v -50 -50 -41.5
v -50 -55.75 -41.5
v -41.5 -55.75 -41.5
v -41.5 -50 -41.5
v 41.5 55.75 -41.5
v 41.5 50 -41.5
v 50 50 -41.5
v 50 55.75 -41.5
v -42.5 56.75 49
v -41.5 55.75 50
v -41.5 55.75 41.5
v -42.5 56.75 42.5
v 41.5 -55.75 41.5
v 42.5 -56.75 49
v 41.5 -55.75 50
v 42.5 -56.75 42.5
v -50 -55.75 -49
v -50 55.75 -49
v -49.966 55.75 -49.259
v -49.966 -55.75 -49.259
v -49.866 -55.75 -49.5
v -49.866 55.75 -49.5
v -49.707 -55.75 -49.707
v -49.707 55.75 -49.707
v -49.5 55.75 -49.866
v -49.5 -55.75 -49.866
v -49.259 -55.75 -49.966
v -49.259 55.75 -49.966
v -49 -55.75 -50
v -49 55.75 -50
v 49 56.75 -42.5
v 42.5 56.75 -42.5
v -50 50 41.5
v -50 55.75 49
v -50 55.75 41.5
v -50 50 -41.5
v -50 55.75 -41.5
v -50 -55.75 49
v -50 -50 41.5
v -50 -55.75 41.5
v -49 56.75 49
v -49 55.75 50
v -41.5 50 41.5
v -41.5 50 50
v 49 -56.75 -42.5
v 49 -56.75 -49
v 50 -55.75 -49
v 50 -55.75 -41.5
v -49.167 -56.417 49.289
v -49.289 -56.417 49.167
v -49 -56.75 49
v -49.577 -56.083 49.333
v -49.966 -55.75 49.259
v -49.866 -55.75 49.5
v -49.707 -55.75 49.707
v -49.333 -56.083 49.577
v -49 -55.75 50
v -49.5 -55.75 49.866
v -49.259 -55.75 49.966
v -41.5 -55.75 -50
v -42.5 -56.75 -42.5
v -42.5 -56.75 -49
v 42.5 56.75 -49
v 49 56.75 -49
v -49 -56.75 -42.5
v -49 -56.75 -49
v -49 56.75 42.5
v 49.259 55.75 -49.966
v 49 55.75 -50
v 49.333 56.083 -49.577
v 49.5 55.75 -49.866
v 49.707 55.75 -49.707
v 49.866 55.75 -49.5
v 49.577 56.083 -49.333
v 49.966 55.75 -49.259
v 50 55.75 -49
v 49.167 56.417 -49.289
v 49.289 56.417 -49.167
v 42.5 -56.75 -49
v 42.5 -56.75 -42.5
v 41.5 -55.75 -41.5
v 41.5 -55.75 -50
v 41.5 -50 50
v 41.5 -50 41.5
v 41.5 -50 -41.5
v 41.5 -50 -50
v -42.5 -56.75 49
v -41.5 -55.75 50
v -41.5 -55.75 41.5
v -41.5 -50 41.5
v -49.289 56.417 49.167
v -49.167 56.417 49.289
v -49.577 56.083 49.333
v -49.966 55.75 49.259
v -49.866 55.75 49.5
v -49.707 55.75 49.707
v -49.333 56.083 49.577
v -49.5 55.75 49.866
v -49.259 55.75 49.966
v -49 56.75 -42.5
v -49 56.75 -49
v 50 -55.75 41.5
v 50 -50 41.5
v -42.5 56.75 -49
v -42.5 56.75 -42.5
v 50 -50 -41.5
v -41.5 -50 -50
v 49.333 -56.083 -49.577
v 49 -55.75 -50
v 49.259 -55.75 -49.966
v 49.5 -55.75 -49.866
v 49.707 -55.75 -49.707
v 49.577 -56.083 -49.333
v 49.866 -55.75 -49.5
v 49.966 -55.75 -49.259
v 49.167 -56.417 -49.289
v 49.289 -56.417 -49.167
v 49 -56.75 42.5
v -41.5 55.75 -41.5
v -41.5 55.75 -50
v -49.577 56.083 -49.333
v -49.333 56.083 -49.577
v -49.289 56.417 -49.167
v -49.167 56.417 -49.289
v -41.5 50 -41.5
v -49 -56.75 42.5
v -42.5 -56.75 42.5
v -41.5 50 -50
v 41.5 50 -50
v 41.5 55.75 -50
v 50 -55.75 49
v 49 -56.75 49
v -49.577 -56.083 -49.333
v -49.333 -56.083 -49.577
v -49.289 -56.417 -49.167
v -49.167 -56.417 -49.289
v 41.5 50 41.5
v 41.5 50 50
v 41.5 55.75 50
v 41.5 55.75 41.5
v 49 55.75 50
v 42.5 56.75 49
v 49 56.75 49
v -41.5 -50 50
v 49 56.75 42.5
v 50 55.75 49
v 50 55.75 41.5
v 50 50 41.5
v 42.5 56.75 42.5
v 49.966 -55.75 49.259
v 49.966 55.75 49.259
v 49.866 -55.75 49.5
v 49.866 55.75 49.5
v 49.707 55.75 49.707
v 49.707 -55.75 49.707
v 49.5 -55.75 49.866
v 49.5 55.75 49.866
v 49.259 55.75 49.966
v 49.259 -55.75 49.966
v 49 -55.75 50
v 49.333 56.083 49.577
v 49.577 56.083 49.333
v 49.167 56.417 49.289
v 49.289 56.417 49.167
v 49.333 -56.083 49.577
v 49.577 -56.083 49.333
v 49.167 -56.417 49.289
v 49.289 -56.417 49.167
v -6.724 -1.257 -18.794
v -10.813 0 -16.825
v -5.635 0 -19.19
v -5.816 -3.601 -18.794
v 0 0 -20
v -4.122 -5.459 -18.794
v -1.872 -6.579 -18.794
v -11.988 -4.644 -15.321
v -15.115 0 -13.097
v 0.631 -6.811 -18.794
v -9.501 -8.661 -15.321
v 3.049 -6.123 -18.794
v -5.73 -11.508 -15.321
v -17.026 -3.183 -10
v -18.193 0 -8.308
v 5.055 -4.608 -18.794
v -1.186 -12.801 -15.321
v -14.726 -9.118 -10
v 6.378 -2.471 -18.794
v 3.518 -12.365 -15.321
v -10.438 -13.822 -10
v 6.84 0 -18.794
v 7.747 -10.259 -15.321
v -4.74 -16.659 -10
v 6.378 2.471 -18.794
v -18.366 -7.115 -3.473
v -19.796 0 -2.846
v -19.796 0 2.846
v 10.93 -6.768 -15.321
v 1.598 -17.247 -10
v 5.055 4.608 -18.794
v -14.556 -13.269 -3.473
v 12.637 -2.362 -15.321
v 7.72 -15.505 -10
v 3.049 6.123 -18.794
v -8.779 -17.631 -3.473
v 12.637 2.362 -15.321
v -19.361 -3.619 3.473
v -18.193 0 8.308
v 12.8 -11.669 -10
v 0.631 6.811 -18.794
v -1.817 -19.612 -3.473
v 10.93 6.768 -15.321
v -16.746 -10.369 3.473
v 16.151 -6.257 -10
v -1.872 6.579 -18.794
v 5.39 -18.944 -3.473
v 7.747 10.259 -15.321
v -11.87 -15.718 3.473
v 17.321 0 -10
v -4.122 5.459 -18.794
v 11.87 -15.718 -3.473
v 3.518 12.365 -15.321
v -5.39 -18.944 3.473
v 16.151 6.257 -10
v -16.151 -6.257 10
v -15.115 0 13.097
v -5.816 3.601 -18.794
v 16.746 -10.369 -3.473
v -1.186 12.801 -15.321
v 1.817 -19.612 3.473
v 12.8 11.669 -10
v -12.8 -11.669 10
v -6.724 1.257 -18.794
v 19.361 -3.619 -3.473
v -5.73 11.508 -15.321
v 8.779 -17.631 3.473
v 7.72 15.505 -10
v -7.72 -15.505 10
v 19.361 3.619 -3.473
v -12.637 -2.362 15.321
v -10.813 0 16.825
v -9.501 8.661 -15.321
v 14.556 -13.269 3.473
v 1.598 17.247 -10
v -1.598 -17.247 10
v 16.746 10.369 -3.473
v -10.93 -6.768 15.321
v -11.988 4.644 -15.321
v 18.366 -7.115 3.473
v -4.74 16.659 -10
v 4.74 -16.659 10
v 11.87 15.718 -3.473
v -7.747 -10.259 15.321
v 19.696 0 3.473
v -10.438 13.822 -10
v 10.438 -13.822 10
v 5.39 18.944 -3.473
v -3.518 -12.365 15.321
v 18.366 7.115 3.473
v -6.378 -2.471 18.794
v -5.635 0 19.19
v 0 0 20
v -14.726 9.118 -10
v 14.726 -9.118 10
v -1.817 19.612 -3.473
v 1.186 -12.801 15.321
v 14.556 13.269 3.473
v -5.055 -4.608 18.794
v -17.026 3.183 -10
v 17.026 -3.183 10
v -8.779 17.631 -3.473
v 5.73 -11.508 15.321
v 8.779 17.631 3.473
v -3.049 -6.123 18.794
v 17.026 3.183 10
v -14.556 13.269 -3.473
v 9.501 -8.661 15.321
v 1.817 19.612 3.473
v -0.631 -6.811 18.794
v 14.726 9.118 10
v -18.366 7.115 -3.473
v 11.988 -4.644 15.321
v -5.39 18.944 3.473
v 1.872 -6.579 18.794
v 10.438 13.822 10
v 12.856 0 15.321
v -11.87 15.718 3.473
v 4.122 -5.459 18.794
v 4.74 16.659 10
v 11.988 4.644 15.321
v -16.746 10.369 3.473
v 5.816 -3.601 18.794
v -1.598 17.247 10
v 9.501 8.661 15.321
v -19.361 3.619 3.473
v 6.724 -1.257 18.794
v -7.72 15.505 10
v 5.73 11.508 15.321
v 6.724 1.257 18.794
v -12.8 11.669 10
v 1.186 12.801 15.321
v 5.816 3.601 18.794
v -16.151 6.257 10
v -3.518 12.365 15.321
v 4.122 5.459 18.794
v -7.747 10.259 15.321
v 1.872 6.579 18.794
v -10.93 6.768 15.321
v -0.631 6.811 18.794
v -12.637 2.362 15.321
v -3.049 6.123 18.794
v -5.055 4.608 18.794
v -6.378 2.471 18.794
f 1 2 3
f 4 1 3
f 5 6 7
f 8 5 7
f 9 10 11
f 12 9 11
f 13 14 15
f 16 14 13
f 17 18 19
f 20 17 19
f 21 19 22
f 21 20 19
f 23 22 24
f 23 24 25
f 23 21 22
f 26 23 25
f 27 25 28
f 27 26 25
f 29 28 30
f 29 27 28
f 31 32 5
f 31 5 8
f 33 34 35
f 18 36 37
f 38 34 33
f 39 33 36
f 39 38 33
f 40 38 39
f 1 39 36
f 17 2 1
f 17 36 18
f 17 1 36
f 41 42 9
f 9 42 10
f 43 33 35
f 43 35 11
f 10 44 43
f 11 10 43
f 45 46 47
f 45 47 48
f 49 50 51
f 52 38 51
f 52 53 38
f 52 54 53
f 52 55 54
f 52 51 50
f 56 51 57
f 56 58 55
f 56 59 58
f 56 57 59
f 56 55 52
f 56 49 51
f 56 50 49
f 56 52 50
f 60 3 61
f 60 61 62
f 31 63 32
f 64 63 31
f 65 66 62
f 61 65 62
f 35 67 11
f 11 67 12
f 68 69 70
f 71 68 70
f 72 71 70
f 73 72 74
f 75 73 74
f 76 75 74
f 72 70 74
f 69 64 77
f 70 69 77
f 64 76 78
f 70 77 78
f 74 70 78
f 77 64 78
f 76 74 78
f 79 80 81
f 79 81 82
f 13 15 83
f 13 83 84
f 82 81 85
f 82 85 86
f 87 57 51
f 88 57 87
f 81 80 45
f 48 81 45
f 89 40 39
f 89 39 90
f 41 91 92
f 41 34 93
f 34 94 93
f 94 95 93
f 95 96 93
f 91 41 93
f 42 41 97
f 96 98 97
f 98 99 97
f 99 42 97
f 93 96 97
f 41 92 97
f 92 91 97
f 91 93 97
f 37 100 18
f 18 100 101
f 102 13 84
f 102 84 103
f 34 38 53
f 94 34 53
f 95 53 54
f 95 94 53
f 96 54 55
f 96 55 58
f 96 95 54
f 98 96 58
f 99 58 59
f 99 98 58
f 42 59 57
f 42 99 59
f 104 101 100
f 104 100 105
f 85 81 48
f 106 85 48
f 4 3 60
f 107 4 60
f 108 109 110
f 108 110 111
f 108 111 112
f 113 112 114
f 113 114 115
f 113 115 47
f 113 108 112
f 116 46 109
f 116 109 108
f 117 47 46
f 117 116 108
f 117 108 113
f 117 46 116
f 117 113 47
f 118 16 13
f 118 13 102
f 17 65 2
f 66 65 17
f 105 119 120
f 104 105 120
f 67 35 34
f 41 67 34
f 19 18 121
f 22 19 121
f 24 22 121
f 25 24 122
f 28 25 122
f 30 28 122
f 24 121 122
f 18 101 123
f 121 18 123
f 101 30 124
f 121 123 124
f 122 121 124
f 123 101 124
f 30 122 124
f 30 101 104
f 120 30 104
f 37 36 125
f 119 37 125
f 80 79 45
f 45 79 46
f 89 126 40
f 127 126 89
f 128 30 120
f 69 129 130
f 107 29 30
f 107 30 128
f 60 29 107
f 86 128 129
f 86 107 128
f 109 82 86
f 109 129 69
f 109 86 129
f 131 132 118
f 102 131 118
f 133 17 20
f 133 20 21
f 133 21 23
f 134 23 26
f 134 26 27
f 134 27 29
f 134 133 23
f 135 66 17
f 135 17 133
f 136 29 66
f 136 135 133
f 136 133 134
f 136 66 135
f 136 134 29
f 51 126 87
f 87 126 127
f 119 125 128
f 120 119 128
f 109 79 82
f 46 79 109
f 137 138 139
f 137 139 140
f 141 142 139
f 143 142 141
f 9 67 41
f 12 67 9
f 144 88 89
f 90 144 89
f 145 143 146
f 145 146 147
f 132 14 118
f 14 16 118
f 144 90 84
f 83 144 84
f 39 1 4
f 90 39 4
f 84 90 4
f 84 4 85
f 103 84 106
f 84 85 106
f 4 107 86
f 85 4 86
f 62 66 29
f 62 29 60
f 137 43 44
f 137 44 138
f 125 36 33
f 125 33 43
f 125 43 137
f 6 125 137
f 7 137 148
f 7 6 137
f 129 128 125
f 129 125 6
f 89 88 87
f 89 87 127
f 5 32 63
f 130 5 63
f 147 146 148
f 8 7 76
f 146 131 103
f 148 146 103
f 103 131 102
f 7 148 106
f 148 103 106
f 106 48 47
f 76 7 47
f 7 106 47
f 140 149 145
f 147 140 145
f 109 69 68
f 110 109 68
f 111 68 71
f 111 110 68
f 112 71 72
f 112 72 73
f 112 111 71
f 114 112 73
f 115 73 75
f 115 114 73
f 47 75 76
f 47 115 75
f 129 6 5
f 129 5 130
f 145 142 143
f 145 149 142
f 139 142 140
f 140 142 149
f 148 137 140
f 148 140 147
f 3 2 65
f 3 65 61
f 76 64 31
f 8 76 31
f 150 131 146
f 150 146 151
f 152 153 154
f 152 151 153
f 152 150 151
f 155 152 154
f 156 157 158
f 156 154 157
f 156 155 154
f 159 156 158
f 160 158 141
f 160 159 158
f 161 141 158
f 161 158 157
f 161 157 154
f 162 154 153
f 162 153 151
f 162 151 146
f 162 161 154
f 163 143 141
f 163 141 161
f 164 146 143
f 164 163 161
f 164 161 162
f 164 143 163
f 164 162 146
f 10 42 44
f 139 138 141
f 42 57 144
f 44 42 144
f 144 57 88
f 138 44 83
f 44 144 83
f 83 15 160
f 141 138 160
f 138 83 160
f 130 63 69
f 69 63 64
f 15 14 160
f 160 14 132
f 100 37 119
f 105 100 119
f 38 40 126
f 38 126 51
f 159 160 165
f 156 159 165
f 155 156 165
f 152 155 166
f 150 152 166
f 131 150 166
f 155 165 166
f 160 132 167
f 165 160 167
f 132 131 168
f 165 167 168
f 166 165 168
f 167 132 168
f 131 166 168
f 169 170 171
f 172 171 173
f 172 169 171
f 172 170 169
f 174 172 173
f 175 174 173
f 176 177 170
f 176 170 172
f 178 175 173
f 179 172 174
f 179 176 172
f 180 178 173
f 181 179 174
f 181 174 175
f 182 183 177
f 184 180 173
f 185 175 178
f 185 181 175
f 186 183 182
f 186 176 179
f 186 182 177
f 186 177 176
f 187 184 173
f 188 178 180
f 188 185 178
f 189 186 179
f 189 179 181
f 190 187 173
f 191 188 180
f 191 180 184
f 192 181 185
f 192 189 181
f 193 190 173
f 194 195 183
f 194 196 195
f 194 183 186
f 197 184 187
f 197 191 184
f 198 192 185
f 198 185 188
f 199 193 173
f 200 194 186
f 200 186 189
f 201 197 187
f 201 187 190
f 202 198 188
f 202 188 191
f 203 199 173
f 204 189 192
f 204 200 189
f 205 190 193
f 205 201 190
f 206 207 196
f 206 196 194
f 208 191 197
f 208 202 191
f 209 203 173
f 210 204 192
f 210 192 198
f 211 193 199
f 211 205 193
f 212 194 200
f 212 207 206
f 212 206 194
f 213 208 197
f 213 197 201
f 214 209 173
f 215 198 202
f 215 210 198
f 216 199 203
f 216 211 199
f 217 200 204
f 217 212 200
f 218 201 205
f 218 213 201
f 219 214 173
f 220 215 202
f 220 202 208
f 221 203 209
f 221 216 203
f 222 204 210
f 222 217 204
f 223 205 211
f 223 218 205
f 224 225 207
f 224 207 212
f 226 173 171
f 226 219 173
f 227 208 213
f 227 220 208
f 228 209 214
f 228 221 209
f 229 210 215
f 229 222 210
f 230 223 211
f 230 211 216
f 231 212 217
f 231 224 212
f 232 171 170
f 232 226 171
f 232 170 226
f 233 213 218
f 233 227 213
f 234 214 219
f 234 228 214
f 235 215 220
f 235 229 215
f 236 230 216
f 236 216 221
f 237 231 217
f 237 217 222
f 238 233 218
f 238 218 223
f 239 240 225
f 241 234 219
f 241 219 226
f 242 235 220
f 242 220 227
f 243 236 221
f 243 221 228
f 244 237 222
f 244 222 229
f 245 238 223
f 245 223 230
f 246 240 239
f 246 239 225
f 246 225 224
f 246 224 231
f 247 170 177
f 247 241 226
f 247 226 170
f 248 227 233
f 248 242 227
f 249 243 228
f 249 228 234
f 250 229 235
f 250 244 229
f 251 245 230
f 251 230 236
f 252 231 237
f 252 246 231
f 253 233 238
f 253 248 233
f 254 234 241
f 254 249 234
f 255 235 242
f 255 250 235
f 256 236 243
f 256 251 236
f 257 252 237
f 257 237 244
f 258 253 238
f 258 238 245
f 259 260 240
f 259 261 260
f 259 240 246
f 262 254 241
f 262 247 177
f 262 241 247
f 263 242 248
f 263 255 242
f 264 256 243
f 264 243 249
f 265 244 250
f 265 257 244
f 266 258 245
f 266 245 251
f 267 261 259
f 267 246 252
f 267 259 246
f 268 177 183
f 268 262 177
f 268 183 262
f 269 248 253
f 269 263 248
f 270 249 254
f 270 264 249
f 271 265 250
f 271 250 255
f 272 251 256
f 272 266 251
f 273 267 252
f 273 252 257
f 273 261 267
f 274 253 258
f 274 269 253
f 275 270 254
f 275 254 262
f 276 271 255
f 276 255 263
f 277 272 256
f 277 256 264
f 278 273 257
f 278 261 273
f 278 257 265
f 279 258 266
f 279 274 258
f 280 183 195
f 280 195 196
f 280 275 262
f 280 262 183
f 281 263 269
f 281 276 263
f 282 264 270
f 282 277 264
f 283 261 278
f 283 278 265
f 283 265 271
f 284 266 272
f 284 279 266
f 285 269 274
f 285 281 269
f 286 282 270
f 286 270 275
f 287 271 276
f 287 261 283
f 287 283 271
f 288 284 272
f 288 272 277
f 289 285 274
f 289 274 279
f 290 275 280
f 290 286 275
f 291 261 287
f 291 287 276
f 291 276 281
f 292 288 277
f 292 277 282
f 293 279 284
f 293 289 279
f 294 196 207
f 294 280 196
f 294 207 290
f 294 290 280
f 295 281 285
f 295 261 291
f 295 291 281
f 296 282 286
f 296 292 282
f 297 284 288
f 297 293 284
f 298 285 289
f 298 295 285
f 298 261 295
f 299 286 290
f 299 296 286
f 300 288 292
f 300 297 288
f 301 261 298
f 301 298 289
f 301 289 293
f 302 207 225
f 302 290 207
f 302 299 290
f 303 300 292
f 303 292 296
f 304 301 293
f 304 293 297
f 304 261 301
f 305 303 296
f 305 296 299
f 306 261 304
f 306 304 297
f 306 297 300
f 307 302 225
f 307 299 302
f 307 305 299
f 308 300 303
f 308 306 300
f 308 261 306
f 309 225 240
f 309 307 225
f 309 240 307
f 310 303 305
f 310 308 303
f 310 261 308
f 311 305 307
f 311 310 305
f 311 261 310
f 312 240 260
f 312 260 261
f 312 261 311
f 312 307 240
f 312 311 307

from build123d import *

# Parameters (mm, degrees)
PERIMETER_DEPTH      = 50
PERIMETER_DEPTH_BACK = 50
PERIMETER_SKETCH_W   = 100
PERIMETER_SKETCH_H   = 100
RAILS_DEPTH          = 56.75
RAILS_DEPTH_BACK     = 56.75
RAIL_SKETCH_W        = 8.5
RAIL_SKETCH_H        = 8.5
FILLET1_R            = 1
CHAMFER1_SIZE        = 1


with BuildPart() as part:
    # CG SKETCH → CENTER OF GRAVITY (revolve)
    with BuildSketch(Plane(origin=(0, 0, 0), x_dir=(1, 0, 0), z_dir=(0, 1, 0))):
        with BuildLine():
            Line((0, -20), (0, 20))
            ThreePointArc((0, 20), (-20, 0), (0, -20))
        make_face()
    revolve(axis=Axis((0, 0, -80.9), (0, 0, 1)))


with BuildPart() as body_2:
    # PERIMETER SKETCH → PERIMETER (new, two sides: drawn at the far end of the back side and taken through both)
    with BuildSketch(Plane(origin=(0, 0, 0), x_dir=(1, 0, 0), z_dir=(0, 1, 0)).offset(-PERIMETER_DEPTH_BACK)):
        Rectangle(PERIMETER_SKETCH_W, PERIMETER_SKETCH_H)
    extrude(amount=PERIMETER_DEPTH + PERIMETER_DEPTH_BACK)

    # RAIL SKETCH → RAILS (add, two sides: drawn at the far end of the back side and taken through both)
    with BuildSketch(Plane(origin=(0, 0, 0), x_dir=(1, 0, 0), z_dir=(0, 1, 0)).offset(-RAILS_DEPTH_BACK)):
        with Locations((-45.75, 45.75)):
            Rectangle(RAIL_SKETCH_W, RAIL_SKETCH_H)
        with Locations((45.75, 45.75)):
            Rectangle(RAIL_SKETCH_W, RAIL_SKETCH_H)
        with Locations((-45.75, -45.75)):
            Rectangle(RAIL_SKETCH_W, RAIL_SKETCH_H)
        with Locations((45.75, -45.75)):
            Rectangle(RAIL_SKETCH_W, RAIL_SKETCH_H)
    extrude(amount=RAILS_DEPTH + RAILS_DEPTH_BACK)

    # Fillet1
    fillet1_edges = [body_2.edges().sort_by_distance(p)[0] for p in [
        (50, 0, 50),
        (-50, 0, 50),
        (-50, 0, -50),
        (50, 0, -50),
    ]]
    fillet(fillet1_edges, radius=FILLET1_R)

    # Chamfer1
    chamfer1_edges = [body_2.edges().sort_by_distance(p)[0] for p in [
        (45.25, 56.75, -50),
        (45.25, -56.75, -50),
        (-50, 56.75, -45.25),
        (-49.707106781, 56.75, -49.707106781),
        (-50, -56.75, -45.25),
        (-49.707106781, -56.75, -49.707106781),
        (50, 56.75, 45.25),
        (50, -56.75, 45.25),
        (49.707106781, 56.75, -49.707106781),
        (49.707106781, -56.75, -49.707106781),
        (-45.25, 56.75, 50),
        (-45.25, -56.75, 50),
        (49.707106781, 56.75, 49.707106781),
        (49.707106781, -56.75, 49.707106781),
        (-49.707106781, 56.75, 49.707106781),
        (-49.707106781, -56.75, 49.707106781),
        (-45.25, -56.75, -50),
        (-41.5, -56.75, -45.75),
        (-45.75, -56.75, -41.5),
        (-45.75, 56.75, -41.5),
        (-41.5, 56.75, -45.75),
        (-45.25, 56.75, -50),
        (50, -56.75, -45.25),
        (45.75, -56.75, -41.5),
        (41.5, -56.75, -45.75),
        (50, 56.75, -45.25),
        (41.5, 56.75, -45.75),
        (45.75, 56.75, -41.5),
        (-50, -56.75, 45.25),
        (-45.75, -56.75, 41.5),
        (-41.5, -56.75, 45.75),
        (-50, 56.75, 45.25),
        (-41.5, 56.75, 45.75),
        (-45.75, 56.75, 41.5),
        (45.25, -56.75, 50),
        (41.5, -56.75, 45.75),
        (45.75, -56.75, 41.5),
        (45.75, 56.75, 41.5),
        (41.5, 56.75, 45.75),
        (45.25, 56.75, 50),
    ]]
    chamfer(chamfer1_edges, length=CHAMFER1_SIZE)


solid = Compound([part.part, body_2.part])
